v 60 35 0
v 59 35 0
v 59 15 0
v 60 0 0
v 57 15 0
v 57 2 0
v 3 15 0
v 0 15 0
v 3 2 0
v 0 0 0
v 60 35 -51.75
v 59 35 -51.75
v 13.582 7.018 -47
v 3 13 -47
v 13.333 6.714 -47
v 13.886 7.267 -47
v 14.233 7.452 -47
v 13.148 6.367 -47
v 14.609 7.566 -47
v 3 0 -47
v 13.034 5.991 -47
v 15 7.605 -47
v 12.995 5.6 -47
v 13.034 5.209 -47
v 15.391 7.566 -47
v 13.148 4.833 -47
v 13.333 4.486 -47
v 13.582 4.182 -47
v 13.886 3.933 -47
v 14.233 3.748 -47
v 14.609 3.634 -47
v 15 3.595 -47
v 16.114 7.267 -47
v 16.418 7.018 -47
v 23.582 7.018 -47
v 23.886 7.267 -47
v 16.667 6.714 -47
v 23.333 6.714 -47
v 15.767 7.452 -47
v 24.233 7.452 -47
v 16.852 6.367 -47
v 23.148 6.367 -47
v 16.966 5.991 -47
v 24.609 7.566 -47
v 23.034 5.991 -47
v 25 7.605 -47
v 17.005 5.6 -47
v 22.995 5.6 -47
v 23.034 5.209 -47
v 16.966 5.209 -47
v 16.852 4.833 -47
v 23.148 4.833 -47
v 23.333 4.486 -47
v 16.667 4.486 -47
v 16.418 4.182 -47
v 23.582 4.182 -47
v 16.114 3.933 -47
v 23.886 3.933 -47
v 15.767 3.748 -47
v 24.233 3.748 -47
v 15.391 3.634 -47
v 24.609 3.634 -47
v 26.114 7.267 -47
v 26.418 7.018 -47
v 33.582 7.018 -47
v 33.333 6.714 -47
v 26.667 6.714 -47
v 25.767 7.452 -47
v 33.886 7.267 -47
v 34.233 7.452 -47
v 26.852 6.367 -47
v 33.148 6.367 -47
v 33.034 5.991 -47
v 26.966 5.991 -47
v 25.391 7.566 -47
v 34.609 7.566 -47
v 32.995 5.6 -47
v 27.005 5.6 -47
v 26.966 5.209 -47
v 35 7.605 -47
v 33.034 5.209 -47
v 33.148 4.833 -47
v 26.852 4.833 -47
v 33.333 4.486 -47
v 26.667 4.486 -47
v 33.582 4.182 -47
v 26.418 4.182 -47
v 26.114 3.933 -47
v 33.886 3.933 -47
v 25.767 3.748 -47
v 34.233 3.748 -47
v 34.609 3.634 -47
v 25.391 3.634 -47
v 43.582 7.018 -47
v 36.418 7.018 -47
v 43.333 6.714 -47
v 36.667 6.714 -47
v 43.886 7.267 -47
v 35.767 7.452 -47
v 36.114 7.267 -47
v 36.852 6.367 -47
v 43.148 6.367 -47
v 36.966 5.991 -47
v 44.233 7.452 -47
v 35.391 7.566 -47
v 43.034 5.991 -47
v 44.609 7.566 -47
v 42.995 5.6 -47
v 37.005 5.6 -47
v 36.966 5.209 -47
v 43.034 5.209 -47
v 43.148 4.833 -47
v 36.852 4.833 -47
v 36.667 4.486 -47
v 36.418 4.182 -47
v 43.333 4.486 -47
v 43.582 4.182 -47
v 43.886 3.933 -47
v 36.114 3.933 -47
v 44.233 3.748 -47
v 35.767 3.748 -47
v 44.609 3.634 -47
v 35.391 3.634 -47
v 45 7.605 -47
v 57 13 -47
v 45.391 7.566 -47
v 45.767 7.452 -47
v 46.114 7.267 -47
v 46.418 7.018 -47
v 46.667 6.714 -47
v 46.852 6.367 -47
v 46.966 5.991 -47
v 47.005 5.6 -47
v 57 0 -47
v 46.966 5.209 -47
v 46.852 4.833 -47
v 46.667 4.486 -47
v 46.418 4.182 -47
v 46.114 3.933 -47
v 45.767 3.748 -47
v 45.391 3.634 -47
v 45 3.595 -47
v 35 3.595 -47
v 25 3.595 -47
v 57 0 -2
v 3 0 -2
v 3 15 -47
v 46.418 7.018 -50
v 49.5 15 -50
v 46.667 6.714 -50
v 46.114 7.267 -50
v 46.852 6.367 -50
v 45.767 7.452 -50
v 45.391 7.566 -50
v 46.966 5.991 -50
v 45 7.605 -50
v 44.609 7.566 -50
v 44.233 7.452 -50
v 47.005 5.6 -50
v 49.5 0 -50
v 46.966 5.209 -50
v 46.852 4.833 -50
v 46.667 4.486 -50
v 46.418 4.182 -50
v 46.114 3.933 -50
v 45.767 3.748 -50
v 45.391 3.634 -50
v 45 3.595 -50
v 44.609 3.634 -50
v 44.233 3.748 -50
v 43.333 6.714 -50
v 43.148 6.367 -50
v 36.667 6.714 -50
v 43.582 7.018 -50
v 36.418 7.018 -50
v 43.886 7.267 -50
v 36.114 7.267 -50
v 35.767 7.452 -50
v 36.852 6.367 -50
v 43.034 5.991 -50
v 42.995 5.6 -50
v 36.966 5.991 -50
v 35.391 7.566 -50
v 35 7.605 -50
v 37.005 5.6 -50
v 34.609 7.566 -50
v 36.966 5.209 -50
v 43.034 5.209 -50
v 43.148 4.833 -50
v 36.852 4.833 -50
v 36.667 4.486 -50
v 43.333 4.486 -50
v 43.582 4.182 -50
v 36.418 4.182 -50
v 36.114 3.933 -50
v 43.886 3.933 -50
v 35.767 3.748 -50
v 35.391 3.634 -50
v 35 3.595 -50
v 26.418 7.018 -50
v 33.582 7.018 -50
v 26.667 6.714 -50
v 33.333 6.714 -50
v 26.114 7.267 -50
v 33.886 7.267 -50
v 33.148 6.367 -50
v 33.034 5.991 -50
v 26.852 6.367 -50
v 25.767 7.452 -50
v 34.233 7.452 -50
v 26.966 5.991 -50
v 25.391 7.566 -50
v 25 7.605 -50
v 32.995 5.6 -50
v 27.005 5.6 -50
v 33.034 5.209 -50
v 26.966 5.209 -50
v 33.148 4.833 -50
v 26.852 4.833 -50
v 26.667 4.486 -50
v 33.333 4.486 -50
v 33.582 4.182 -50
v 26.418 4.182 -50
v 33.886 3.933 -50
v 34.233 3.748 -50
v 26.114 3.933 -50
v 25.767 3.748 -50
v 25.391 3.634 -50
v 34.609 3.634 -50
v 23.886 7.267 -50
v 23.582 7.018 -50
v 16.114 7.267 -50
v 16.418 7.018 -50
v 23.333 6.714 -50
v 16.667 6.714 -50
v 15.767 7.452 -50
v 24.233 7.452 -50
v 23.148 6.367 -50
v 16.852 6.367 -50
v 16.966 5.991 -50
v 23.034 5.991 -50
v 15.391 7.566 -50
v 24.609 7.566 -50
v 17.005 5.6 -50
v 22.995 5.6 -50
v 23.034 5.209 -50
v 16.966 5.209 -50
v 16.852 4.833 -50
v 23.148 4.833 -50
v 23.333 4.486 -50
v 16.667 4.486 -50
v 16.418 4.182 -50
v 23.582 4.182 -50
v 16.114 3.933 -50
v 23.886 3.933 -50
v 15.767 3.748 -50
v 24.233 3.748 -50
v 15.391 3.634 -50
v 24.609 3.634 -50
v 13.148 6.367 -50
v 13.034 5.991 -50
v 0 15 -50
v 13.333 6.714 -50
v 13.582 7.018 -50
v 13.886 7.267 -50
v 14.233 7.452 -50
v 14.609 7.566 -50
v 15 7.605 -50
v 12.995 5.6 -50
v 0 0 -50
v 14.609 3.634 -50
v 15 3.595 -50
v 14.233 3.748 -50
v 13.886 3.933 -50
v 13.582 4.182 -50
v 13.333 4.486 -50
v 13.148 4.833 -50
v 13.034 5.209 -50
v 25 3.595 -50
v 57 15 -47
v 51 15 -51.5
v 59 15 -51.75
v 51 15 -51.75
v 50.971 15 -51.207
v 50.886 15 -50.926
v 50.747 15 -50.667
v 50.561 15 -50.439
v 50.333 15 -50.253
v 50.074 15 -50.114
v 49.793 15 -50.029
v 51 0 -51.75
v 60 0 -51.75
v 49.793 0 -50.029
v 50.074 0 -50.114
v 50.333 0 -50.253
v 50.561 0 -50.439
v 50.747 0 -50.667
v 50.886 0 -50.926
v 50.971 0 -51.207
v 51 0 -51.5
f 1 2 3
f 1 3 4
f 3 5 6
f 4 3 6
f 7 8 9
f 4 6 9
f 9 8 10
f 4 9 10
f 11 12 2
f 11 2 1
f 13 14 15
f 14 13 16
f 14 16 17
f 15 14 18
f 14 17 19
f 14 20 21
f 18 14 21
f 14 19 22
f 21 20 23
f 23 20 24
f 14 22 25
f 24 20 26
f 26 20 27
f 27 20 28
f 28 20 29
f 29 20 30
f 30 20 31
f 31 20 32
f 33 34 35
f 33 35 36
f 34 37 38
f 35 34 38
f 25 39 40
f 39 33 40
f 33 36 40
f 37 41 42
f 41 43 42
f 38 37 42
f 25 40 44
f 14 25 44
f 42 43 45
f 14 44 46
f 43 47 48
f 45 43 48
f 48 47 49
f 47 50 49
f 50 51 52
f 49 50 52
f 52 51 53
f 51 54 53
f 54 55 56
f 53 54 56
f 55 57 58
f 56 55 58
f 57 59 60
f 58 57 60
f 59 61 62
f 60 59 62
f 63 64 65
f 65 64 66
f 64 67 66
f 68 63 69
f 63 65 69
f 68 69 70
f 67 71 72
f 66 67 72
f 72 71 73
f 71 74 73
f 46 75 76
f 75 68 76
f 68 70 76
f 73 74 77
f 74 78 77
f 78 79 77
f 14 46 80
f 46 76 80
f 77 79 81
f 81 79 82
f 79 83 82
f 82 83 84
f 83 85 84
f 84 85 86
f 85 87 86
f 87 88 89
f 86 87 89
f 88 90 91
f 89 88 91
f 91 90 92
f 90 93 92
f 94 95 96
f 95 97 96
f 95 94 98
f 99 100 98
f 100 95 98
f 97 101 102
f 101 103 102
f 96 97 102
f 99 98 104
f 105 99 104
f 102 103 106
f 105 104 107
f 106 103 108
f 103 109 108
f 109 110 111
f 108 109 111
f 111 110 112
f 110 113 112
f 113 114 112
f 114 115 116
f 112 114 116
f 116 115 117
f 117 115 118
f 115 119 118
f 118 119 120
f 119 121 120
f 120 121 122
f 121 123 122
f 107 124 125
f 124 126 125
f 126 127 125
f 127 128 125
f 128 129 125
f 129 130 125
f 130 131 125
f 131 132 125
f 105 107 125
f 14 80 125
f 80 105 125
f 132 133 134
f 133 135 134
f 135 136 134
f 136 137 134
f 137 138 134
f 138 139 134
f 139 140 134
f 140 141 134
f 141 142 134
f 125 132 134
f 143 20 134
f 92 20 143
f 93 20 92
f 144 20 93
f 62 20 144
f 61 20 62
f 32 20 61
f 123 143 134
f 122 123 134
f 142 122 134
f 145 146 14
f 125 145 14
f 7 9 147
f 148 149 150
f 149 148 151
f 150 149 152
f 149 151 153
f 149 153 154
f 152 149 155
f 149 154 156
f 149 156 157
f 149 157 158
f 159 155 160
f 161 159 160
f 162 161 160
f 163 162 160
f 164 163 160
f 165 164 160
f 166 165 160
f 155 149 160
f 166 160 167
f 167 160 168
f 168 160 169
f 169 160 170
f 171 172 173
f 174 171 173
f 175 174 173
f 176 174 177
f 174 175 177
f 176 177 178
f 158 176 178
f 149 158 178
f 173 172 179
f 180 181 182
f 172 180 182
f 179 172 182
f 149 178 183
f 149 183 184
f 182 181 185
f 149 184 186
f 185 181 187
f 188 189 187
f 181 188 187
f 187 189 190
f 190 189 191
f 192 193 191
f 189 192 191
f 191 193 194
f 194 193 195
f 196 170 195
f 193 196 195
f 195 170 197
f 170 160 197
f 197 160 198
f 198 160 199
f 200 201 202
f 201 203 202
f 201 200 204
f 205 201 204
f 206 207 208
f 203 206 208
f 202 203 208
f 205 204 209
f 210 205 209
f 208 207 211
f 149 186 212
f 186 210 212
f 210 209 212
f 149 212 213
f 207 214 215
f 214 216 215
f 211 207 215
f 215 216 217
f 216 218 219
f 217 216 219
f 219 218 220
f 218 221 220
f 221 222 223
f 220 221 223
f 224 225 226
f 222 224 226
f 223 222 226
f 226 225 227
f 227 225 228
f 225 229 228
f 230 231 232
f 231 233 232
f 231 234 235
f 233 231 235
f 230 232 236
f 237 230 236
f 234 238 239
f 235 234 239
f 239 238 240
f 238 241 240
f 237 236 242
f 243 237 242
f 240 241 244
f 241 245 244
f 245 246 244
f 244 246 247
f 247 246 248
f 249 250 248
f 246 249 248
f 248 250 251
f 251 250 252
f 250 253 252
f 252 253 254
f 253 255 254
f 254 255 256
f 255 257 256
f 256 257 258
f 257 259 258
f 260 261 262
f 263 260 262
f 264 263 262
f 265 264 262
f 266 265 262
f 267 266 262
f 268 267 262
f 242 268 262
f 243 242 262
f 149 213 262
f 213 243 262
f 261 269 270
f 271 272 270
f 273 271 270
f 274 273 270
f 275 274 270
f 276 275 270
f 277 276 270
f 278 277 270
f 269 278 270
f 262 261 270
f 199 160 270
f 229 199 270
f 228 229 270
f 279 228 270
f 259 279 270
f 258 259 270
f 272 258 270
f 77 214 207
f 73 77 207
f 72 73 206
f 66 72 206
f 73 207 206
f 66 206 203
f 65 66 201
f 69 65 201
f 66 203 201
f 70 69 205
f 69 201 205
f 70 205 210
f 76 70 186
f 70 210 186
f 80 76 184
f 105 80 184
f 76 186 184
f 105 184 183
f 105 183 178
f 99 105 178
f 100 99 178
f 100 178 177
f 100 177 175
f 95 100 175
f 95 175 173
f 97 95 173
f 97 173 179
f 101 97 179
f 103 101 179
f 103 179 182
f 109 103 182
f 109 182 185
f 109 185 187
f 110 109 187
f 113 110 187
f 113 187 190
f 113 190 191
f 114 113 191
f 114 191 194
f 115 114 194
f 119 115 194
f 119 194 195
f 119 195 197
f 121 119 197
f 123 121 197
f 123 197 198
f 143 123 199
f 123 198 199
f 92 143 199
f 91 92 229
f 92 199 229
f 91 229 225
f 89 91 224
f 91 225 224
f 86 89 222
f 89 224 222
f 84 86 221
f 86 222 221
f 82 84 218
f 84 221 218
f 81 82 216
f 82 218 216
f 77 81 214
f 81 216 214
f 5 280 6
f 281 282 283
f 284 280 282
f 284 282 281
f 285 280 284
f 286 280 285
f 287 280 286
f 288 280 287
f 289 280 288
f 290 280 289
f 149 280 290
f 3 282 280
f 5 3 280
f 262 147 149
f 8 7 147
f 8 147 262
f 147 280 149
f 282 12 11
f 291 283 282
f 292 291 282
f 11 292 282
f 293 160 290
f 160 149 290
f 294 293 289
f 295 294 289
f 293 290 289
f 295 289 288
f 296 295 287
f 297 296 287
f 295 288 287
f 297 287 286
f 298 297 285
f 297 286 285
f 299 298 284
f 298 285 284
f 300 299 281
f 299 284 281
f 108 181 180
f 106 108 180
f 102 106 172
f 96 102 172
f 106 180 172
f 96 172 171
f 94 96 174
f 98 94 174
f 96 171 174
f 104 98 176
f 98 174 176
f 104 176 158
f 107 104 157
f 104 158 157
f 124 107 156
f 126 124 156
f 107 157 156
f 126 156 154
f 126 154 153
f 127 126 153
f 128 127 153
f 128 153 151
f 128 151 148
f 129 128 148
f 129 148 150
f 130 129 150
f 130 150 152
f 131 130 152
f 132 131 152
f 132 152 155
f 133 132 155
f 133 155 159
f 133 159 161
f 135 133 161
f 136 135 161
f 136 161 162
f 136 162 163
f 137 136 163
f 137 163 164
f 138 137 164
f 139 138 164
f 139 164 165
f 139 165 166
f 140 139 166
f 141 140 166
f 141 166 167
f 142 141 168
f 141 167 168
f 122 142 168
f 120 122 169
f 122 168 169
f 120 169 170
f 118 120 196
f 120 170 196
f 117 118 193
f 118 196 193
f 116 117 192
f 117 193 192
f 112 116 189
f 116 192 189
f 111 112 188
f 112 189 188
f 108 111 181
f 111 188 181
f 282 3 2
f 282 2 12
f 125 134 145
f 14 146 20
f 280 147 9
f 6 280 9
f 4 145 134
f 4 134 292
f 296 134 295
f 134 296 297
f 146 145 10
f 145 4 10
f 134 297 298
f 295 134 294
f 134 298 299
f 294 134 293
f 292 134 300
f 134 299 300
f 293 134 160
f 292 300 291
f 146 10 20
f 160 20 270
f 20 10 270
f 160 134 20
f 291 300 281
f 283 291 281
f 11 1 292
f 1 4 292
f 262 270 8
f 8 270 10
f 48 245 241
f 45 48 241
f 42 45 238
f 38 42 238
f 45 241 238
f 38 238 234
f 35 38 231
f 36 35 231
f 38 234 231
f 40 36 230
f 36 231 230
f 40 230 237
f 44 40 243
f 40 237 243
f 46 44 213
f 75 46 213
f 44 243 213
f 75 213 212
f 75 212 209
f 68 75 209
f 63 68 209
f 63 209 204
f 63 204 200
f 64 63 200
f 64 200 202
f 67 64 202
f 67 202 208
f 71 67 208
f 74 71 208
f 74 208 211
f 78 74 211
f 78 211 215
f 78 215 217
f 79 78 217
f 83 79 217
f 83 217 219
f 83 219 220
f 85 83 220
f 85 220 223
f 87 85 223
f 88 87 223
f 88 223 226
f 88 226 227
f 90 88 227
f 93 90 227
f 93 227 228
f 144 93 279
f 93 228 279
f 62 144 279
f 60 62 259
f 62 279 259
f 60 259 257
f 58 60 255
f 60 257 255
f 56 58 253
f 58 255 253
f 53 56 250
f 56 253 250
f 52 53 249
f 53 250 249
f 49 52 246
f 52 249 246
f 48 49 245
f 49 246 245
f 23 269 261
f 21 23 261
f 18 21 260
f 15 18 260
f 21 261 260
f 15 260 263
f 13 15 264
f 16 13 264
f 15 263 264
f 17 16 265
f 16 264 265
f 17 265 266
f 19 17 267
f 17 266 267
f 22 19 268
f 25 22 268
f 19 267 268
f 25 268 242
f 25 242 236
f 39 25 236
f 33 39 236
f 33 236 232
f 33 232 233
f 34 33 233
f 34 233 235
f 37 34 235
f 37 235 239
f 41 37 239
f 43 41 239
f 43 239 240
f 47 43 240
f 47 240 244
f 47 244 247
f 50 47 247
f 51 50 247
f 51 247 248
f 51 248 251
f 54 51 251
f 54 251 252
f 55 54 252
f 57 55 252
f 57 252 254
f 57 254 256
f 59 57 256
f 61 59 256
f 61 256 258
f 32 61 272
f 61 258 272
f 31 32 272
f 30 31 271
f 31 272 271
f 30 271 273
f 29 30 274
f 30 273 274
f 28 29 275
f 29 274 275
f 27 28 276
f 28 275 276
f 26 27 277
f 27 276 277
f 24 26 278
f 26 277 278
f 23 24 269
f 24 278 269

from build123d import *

# Parameters (mm, degrees)
SKETCH1_W           = 60
SKETCH1_H           = 50
BOSS_EXTRUDE1_DEPTH = 2
BOSS_EXTRUDE2_DEPTH = 13
SKETCH3_W           = 9
SKETCH3_H           = 15
BOSS_EXTRUDE3_DEPTH = 1.75
FILLET1_R           = 1.5
CUT_EXTRUDE1_REACH  = 81.53
SKETCH4_R           = 2.005
SKETCH5_W           = 1
SKETCH5_H           = 51.75
BOSS_EXTRUDE4_DEPTH = 20
SKETCH6_W           = 54
SKETCH6_H           = 2
CUT_EXTRUDE2_DEPTH  = 47
BOSS_EXTRUDE5_REACH = 86.57


with BuildPart() as part:
    # Sketch1 → Boss-Extrude1 (new body)
    with BuildSketch(Plane(origin=(0, 0, 0), x_dir=(1, 0, 0), z_dir=(0, 1, 0))):
        with Locations((30, 25)):
            Rectangle(SKETCH1_W, SKETCH1_H)
    extrude(amount=BOSS_EXTRUDE1_DEPTH)

    # Sketch2 → Boss-Extrude2 (add)
    with BuildSketch(Plane(origin=(0, 2, 0), x_dir=(1, 0, 0), z_dir=(0, 1, 0))):
        Polygon((60, 0), (60, 50), (0, 50), (0, 0), (3, 0), (3, 47), (57, 47), (57, 0), align=None)
    extrude(amount=BOSS_EXTRUDE2_DEPTH)

    # Sketch3 → Boss-Extrude3 (add)
    with BuildSketch(Plane(origin=(0, 0, -50), x_dir=(-1, 0, 0), z_dir=(0, 0, -1))):
        with Locations((-55.5, 7.5)):
            Rectangle(SKETCH3_W, SKETCH3_H)
    extrude(amount=BOSS_EXTRUDE3_DEPTH)

    # Fillet1
    fillet1_edges = [part.edges().sort_by_distance(p)[0] for p in [
        (51, 7.5, -50),
    ]]
    fillet(fillet1_edges, radius=FILLET1_R)

    # Sketch4 → Cut-Extrude1 (cut, up to next)
    with BuildSketch(Plane(origin=(0, 0, -50), x_dir=(-1, 0, 0), z_dir=(0, 0, -1)), mode=Mode.PRIVATE) as cut_extrude1_sk1:
        with Locations((-45, 5.6)):
            Circle(SKETCH4_R)
    cut_extrude1_tool1 = extrude(cut_extrude1_sk1.sketch, amount=-CUT_EXTRUDE1_REACH, mode=Mode.PRIVATE) & part.part
    # Sketch4 → Cut-Extrude1 (cut, up to next)
    with BuildSketch(Plane(origin=(0, 0, -50), x_dir=(-1, 0, 0), z_dir=(0, 0, -1)), mode=Mode.PRIVATE) as cut_extrude1_sk2:
        with Locations((-35, 5.6)):
            Circle(SKETCH4_R)
    cut_extrude1_tool2 = extrude(cut_extrude1_sk2.sketch, amount=-CUT_EXTRUDE1_REACH, mode=Mode.PRIVATE) & part.part
    # Sketch4 → Cut-Extrude1 (cut, up to next)
    with BuildSketch(Plane(origin=(0, 0, -50), x_dir=(-1, 0, 0), z_dir=(0, 0, -1)), mode=Mode.PRIVATE) as cut_extrude1_sk3:
        with Locations((-25, 5.6)):
            Circle(SKETCH4_R)
    cut_extrude1_tool3 = extrude(cut_extrude1_sk3.sketch, amount=-CUT_EXTRUDE1_REACH, mode=Mode.PRIVATE) & part.part
    # Sketch4 → Cut-Extrude1 (cut, up to next)
    with BuildSketch(Plane(origin=(0, 0, -50), x_dir=(-1, 0, 0), z_dir=(0, 0, -1)), mode=Mode.PRIVATE) as cut_extrude1_sk4:
        with Locations((-15, 5.6)):
            Circle(SKETCH4_R)
    cut_extrude1_tool4 = extrude(cut_extrude1_sk4.sketch, amount=-CUT_EXTRUDE1_REACH, mode=Mode.PRIVATE) & part.part
    add(cut_extrude1_tool1.solids().sort_by_distance((45, 5.6, -50))[0], mode=Mode.SUBTRACT)
    add(cut_extrude1_tool2.solids().sort_by_distance((35, 5.6, -50))[0], mode=Mode.SUBTRACT)
    add(cut_extrude1_tool3.solids().sort_by_distance((25, 5.6, -50))[0], mode=Mode.SUBTRACT)
    add(cut_extrude1_tool4.solids().sort_by_distance((15, 5.6, -50))[0], mode=Mode.SUBTRACT)

    # Sketch5 → Boss-Extrude4 (add)
    with BuildSketch(Plane(origin=(0, 15, 0), x_dir=(1, 0, 0), z_dir=(0, 1, 0))):
        with Locations((59.5, 25.875)):
            Rectangle(SKETCH5_W, SKETCH5_H)
    extrude(amount=BOSS_EXTRUDE4_DEPTH)

    # Sketch6 → Cut-Extrude2 (cut)
    with BuildSketch(Plane.XY):
        with Locations((30, 1)):
            Rectangle(SKETCH6_W, SKETCH6_H)
    extrude(amount=-CUT_EXTRUDE2_DEPTH, mode=Mode.SUBTRACT)

    # Sketch7 → Boss-Extrude5 (add, up to next)
    with BuildSketch(Plane(origin=(3, 0, 0), x_dir=(0, 0, -1), z_dir=(1, 0, 0)), mode=Mode.PRIVATE) as boss_extrude5_sk1:
        Polygon((0, 2), (0, 0), (2, 0), (47, 13), (47, 15), align=None)
    boss_extrude5_tool1 = extrude(boss_extrude5_sk1.sketch, amount=BOSS_EXTRUDE5_REACH, mode=Mode.PRIVATE) - part.part
    add(boss_extrude5_tool1.solids().sort_by_distance((3, 7.115265, -22.629283))[0])


solid = part.part
